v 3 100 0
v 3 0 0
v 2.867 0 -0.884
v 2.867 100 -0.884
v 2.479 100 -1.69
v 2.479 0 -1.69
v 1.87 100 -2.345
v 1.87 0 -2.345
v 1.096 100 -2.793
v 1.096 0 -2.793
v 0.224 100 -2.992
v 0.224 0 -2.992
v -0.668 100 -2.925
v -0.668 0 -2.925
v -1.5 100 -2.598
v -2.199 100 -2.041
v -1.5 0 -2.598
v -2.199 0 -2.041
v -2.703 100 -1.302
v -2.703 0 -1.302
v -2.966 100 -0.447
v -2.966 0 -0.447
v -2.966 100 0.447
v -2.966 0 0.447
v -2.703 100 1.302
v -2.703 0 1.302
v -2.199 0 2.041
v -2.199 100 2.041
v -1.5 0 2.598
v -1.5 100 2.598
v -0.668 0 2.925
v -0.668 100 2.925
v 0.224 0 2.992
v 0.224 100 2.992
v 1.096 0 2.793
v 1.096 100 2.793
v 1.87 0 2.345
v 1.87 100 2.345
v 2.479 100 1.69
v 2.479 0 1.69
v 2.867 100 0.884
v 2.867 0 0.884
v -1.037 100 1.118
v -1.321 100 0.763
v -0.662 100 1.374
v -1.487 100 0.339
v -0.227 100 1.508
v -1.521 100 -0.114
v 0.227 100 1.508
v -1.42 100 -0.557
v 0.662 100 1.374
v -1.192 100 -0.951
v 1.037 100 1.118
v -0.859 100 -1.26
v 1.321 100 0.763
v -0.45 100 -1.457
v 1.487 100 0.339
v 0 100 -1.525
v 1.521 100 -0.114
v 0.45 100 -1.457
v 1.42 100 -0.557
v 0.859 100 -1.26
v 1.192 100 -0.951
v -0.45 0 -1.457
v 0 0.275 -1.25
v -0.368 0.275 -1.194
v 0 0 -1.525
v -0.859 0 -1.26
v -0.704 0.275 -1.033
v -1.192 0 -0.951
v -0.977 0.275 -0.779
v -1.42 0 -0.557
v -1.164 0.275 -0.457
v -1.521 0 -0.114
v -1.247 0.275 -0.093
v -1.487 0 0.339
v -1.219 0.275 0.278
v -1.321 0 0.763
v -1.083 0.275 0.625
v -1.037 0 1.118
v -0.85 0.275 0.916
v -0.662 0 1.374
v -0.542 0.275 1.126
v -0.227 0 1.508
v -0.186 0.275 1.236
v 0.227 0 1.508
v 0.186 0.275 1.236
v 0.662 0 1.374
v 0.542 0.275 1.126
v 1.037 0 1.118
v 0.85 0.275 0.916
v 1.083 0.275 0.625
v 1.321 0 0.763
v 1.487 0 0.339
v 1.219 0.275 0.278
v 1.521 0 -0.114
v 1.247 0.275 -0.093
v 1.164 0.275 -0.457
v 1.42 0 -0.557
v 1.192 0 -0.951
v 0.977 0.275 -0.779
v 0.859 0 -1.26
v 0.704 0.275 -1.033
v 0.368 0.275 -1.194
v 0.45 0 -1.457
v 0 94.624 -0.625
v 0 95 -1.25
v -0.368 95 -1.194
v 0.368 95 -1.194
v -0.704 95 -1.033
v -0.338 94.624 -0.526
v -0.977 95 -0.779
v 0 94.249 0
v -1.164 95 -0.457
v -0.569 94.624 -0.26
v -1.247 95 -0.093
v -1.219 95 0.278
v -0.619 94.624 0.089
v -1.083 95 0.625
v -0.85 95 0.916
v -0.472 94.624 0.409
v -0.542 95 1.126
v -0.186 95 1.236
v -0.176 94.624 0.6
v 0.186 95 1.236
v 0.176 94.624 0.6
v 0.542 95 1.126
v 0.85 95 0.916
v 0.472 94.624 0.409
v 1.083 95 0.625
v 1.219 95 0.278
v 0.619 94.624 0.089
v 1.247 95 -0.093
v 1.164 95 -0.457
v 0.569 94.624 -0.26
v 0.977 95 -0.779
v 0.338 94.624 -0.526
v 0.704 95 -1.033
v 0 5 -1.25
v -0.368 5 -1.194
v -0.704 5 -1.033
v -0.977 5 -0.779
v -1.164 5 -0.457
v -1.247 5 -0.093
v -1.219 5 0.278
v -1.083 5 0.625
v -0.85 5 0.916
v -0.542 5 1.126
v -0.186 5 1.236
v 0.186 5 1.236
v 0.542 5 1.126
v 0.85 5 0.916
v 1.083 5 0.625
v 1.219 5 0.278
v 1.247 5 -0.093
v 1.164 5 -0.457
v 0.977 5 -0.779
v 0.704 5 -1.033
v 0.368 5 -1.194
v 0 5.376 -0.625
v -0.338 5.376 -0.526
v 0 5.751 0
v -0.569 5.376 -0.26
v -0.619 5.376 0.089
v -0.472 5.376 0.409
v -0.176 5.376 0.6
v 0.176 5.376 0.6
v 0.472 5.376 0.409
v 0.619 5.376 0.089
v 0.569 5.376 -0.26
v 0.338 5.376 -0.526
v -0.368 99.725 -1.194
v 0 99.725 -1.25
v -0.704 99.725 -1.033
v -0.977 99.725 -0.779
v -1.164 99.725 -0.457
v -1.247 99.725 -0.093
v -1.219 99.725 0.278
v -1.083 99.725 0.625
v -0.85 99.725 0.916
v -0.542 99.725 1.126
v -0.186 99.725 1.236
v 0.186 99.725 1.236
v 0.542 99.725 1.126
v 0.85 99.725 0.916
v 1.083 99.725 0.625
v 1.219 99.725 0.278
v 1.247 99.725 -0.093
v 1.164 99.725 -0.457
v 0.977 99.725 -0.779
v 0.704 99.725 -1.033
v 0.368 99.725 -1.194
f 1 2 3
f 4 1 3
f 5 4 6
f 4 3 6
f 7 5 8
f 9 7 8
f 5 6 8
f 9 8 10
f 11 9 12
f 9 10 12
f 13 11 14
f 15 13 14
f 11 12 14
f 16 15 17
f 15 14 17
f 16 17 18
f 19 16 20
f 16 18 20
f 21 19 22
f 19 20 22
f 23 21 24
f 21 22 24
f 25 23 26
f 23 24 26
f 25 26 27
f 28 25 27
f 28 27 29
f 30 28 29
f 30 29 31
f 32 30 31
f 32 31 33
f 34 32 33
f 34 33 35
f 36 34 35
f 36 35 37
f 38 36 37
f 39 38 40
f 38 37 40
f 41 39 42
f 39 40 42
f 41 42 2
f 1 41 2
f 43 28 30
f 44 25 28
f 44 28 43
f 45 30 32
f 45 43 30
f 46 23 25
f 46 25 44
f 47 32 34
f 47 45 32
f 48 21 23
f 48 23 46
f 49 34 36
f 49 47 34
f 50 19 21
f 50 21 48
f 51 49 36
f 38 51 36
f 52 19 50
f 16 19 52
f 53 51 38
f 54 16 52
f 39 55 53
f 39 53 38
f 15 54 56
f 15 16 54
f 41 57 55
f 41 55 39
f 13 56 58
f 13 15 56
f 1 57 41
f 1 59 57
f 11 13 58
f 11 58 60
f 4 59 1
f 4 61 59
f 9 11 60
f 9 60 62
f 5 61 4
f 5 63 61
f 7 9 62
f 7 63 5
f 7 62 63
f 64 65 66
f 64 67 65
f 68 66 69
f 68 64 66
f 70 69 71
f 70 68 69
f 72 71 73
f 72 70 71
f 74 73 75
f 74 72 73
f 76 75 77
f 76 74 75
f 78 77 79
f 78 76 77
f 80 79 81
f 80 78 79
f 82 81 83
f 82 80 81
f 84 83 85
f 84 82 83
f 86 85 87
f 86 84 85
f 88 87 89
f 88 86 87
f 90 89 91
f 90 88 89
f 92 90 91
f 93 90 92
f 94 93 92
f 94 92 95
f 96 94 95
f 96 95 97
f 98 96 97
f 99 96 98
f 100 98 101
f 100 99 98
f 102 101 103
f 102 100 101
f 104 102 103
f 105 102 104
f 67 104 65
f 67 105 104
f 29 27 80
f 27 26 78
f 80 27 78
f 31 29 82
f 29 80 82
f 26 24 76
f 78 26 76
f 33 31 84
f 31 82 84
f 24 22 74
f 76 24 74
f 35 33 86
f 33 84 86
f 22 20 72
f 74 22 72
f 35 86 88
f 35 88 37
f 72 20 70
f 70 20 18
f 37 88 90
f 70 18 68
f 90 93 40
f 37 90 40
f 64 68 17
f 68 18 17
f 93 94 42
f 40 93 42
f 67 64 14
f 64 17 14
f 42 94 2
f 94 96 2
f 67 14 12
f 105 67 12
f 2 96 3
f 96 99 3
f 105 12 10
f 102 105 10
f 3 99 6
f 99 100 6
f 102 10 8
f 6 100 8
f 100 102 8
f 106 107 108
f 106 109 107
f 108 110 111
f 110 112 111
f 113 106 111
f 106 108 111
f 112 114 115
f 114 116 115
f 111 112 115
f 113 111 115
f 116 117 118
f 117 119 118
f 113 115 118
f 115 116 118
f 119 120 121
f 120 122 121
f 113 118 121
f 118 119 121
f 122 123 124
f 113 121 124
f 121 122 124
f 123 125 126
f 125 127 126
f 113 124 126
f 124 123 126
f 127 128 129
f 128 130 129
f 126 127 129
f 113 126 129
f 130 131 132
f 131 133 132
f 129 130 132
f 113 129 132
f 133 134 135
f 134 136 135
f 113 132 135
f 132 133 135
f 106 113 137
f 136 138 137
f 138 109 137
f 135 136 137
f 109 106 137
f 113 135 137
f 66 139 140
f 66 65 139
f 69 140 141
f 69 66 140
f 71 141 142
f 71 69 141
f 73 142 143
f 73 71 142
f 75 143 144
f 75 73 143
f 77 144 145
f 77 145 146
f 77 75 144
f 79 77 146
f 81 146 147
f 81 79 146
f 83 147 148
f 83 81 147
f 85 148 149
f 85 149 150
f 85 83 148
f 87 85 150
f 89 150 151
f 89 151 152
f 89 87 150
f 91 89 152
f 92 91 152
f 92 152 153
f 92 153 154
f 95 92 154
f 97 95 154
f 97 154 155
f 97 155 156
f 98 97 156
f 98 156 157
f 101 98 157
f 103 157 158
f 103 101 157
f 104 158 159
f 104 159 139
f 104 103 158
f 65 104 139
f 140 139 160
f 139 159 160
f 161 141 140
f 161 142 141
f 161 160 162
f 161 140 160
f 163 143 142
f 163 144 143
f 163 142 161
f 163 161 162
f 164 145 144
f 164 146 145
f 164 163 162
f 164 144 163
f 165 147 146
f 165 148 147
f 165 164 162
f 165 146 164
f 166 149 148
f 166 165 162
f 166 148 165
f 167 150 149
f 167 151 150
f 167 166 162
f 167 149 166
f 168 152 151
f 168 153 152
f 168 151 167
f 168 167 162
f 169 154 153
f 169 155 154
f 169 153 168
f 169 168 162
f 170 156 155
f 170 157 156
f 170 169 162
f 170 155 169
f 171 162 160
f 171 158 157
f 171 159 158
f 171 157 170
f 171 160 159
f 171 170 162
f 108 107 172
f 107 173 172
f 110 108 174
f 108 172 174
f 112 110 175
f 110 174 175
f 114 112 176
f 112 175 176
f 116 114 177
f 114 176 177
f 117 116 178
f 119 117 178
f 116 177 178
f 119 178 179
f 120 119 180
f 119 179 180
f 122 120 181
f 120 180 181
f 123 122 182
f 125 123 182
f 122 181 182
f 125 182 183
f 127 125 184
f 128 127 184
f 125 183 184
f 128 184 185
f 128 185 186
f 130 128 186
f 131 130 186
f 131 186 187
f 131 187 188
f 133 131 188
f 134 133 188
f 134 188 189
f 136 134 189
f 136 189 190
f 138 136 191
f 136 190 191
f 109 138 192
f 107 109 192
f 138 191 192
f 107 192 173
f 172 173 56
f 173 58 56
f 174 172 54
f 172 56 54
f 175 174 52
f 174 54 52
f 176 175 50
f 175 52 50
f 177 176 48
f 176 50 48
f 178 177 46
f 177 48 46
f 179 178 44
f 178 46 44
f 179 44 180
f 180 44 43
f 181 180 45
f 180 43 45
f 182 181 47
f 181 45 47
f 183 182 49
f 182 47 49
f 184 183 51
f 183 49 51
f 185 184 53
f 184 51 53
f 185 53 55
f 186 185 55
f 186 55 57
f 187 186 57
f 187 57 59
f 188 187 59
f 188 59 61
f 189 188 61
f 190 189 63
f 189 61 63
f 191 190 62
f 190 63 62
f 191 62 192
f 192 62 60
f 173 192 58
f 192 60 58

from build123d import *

# Parameters (mm, degrees)
SKETCH1_R           = 3
BOSS_EXTRUDE1_DEPTH = 100


with BuildPart() as part:
    # Sketch1 → Boss-Extrude1 (new body)
    with BuildSketch(Plane(origin=(0, 0, 0), x_dir=(1, 0, 0), z_dir=(0, 1, 0))):
        Circle(SKETCH1_R)
    extrude(amount=BOSS_EXTRUDE1_DEPTH)

    # Sketch3 → M3x0.5 Tapped Hole1 (revolve, cut)
    with BuildSketch(Plane(origin=(0, 0, 0), x_dir=(0, 0, -1), z_dir=(1, 0, 0))):
        Polygon((0, 0), (0, 5.751075774), (1.25, 5), (1.25, 0.275), (1.525, 0), align=None)
    m3x0_5_tapped_hole1 = revolve(axis=Axis((0, -6.35, 0), (0, 1, 0)), mode=Mode.SUBTRACT)

    # Mirror1: M3x0.5 Tapped Hole1 across plane
    add(m3x0_5_tapped_hole1.mirror(Plane.ZX.offset(50)), mode=Mode.SUBTRACT)


solid = part.part
